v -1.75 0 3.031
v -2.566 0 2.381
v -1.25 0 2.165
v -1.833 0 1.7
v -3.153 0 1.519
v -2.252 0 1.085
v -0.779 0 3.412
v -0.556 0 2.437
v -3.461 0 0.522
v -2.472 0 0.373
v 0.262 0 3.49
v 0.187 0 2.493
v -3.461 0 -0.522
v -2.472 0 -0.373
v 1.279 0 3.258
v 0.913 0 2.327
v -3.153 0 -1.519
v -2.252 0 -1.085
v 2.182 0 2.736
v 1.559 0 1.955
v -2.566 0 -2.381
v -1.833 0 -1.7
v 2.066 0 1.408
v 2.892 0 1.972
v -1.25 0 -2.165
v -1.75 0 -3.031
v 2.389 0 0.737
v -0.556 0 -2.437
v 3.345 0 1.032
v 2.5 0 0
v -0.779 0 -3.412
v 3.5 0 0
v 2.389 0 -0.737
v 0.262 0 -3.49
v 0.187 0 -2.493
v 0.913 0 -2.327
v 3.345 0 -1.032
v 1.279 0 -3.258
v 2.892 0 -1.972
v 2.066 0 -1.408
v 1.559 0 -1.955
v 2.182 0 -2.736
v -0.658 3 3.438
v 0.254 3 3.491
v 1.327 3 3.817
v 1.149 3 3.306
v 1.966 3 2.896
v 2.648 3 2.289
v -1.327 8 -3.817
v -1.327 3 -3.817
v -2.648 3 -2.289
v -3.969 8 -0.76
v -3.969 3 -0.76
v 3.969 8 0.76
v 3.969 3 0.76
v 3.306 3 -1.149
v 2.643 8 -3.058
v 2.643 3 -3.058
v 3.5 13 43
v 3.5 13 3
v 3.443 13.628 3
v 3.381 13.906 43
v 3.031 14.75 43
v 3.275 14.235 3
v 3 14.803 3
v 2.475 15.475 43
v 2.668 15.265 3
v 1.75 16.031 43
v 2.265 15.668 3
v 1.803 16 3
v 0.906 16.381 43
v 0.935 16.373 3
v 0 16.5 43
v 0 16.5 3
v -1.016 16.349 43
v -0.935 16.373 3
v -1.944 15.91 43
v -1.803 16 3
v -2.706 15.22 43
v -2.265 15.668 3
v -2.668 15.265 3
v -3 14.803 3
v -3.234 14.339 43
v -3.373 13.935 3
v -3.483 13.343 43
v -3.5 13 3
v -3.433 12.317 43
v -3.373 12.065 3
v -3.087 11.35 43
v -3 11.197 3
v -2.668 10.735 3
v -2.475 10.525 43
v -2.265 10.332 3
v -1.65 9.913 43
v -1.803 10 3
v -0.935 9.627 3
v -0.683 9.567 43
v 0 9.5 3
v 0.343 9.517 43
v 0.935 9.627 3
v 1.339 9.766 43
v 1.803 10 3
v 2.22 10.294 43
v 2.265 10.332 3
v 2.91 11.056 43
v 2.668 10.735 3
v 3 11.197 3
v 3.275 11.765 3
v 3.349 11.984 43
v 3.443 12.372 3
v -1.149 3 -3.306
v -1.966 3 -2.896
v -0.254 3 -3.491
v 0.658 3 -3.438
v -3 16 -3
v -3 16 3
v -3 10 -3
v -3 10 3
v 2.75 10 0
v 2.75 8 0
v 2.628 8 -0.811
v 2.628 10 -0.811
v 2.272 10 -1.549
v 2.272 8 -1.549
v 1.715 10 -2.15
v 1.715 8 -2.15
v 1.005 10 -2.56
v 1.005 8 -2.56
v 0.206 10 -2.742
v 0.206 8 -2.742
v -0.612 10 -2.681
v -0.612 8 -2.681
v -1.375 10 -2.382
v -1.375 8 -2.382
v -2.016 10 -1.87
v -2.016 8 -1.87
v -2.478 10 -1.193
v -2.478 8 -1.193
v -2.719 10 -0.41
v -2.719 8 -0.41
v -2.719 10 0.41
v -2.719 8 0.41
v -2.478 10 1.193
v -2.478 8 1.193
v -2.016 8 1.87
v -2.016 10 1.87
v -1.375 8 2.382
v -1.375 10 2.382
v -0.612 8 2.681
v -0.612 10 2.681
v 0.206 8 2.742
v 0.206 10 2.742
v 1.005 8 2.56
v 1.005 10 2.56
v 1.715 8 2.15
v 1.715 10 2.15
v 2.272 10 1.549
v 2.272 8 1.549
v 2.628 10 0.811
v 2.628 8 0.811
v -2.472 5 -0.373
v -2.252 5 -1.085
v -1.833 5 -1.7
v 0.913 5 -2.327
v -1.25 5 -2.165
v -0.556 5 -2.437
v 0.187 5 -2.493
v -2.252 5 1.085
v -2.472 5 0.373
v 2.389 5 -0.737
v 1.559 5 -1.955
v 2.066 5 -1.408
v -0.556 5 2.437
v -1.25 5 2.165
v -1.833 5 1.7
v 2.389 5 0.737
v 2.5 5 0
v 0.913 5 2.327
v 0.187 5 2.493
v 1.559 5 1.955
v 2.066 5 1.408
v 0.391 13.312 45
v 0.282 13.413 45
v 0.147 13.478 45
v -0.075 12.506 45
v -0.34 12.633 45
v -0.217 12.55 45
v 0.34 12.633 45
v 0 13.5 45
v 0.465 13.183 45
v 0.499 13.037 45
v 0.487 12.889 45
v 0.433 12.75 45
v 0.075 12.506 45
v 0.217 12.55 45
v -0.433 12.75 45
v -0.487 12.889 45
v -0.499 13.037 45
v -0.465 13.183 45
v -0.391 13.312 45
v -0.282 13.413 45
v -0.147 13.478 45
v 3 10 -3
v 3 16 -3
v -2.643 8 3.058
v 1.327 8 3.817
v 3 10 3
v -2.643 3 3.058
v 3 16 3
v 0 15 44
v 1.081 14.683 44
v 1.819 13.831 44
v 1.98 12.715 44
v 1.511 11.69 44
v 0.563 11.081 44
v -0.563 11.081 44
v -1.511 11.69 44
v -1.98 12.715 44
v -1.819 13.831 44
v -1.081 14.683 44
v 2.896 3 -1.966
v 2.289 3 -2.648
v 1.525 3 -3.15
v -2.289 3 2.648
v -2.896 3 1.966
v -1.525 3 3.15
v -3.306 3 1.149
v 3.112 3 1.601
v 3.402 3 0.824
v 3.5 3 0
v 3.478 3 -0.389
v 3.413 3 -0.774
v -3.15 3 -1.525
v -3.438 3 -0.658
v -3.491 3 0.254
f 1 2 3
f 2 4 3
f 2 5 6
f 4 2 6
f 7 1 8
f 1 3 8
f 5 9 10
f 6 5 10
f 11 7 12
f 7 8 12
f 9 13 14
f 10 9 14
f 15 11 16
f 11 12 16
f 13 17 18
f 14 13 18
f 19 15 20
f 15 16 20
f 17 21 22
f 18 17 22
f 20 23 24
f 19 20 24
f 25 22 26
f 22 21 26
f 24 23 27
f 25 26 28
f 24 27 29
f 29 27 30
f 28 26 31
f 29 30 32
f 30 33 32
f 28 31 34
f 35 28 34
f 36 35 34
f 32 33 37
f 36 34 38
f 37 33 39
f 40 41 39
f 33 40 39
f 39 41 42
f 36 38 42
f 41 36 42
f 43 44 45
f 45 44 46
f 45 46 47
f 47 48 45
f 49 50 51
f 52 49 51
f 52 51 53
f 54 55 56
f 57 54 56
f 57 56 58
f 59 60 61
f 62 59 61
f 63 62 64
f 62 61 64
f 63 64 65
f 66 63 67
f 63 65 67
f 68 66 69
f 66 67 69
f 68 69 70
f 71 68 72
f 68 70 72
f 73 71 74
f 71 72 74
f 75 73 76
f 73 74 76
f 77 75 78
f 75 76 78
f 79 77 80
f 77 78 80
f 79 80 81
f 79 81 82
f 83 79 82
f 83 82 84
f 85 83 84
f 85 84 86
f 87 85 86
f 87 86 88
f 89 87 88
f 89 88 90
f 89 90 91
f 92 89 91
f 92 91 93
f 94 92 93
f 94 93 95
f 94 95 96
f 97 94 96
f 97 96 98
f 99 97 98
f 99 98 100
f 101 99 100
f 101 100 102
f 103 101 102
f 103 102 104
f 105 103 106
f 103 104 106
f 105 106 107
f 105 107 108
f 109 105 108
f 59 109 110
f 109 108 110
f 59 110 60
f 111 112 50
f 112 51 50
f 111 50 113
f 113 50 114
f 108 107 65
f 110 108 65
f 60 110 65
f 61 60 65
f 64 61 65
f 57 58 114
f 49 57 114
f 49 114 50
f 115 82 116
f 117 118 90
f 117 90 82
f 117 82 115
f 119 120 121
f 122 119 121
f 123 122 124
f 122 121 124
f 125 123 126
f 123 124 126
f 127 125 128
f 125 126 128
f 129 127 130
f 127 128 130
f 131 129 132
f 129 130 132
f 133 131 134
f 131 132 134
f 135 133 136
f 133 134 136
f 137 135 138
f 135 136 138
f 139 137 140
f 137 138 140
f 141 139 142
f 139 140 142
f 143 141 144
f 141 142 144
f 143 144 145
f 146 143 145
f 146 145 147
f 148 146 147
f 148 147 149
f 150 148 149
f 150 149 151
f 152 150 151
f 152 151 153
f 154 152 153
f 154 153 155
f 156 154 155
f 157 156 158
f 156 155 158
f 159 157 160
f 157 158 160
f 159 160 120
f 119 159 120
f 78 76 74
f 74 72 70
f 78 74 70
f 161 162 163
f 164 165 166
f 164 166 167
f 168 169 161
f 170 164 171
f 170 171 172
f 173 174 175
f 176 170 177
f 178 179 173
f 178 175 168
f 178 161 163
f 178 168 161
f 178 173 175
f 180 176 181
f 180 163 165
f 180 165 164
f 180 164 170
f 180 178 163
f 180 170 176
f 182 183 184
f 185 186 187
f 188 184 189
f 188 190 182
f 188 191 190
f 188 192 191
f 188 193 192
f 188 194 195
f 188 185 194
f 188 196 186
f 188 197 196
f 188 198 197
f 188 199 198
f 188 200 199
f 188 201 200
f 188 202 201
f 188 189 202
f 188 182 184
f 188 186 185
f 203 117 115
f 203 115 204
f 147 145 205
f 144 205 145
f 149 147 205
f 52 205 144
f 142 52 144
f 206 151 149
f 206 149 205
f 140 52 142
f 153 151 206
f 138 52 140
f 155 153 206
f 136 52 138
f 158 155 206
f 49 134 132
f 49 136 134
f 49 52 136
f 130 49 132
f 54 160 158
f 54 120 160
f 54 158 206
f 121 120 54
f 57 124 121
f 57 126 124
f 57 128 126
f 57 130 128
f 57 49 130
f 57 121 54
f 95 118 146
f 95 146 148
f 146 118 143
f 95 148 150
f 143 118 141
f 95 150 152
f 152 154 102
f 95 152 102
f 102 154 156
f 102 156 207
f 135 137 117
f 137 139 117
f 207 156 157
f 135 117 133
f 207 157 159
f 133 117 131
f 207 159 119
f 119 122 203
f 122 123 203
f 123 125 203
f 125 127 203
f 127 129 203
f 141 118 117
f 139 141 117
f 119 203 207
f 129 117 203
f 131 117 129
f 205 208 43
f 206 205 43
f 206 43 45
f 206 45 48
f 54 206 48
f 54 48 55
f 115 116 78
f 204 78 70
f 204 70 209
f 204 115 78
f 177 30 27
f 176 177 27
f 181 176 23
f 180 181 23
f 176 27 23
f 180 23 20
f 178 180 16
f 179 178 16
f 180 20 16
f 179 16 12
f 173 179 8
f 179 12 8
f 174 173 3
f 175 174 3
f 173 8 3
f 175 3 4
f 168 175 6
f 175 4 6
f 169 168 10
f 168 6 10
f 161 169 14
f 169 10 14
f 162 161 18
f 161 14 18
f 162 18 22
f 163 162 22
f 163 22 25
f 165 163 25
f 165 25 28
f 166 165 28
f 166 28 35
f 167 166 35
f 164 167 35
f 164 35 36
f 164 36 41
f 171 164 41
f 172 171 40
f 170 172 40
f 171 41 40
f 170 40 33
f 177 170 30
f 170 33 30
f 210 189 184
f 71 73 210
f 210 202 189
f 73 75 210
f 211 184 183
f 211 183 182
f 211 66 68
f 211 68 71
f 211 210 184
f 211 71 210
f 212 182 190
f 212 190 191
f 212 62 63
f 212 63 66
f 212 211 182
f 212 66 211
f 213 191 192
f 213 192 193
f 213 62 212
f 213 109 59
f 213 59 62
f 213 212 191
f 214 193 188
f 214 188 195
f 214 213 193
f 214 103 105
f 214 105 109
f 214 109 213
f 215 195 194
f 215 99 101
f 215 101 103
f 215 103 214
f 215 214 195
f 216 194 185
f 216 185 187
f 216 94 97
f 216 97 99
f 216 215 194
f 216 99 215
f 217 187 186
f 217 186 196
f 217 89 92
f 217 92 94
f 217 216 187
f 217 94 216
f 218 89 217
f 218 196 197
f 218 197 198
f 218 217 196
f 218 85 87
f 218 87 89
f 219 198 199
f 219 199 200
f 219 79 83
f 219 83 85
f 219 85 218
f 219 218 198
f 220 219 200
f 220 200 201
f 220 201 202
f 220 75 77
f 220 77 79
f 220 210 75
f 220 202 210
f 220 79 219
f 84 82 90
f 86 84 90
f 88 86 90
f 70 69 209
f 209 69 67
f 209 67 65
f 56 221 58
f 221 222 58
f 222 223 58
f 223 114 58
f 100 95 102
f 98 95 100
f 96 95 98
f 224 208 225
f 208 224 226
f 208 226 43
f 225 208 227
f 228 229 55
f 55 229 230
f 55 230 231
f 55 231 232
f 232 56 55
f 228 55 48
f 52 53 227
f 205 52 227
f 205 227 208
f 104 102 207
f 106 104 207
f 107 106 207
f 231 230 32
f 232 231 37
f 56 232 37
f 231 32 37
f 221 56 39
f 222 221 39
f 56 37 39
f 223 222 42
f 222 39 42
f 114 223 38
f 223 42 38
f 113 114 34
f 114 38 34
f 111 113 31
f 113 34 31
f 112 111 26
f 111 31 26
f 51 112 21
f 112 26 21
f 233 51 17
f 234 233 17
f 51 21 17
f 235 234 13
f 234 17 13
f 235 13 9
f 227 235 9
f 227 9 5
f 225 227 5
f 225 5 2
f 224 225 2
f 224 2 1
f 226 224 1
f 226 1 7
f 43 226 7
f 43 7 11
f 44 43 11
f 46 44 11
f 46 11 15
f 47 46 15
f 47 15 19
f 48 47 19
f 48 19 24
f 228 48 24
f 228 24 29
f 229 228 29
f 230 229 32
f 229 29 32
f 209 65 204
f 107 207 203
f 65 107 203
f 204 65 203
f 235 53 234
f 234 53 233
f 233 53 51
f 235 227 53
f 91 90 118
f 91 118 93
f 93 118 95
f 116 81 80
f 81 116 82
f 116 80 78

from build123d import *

# Parameters (mm, degrees)
SKETCH_1_R          = 3.5
EXTRUDE_1_DEPTH     = 3
EXTRUDE_2_DEPTH     = 5
SKETCH_3_R          = 2.75
EXTRUDE_3_DEPTH     = 2
SKETCH_4_R          = 2.5
CUT_EXTRUDE_1_DEPTH = 5
SKETCH_5_W          = 6
SKETCH_5_H          = 6
EXTRUDE_4_DEPTH     = 6
SKETCH_6_R          = 3.5
EXTRUDE_7_DEPTH     = 40


with BuildPart() as part:
    # 草图1 → 凸台-拉伸1 (new body)
    with BuildSketch(Plane(origin=(0, 0, 0), x_dir=(1, 0, 0), z_dir=(0, 1, 0))):
        Circle(SKETCH_1_R)
    extrude(amount=EXTRUDE_1_DEPTH)

    # 草图2 → 凸台-拉伸2 (add)
    with BuildSketch(Plane(origin=(0, 3, 0), x_dir=(1, 0, 0), z_dir=(0, 1, 0))):
        Polygon((2.642653224, 3.057730738), (-1.326745885, 3.817470195), (-3.96939911, 0.759739456), (-2.642653224, -3.057730738), (1.326745885, -3.817470195), (3.96939911, -0.759739456), align=None)
    extrude(amount=EXTRUDE_2_DEPTH)

    # 草图3 → 凸台-拉伸3 (add)
    with BuildSketch(Plane(origin=(0, 8, 0), x_dir=(1, 0, 0), z_dir=(0, 1, 0))):
        Circle(SKETCH_3_R)
    extrude(amount=EXTRUDE_3_DEPTH)

    # 草图4 → 切除-拉伸1 (cut)
    with BuildSketch(Plane.XZ):
        Circle(SKETCH_4_R)
    extrude(amount=-CUT_EXTRUDE_1_DEPTH, mode=Mode.SUBTRACT)

    # 草图5 → 凸台-拉伸4 (add)
    with BuildSketch(Plane(origin=(0, 10, 0), x_dir=(1, 0, 0), z_dir=(0, 1, 0))):
        Rectangle(SKETCH_5_W, SKETCH_5_H)
    extrude(amount=EXTRUDE_4_DEPTH)

    # 草图6 → 凸台-拉伸7 (add)
    with BuildSketch(Plane.XY.offset(3)):
        with Locations((0, 13)):
            Circle(SKETCH_6_R)
    extrude(amount=EXTRUDE_7_DEPTH)

    # 草图7 → 旋转1 (revolve)
    with BuildSketch(Plane(origin=(0, 0, 0), x_dir=(0, 0, -1), z_dir=(1, 0, 0))):
        Polygon((-43, 16.5), (-43, 13), (-45, 13), (-45, 13.5), align=None)
    revolve(axis=Axis((0, 13, 43), (0, 0, -1)))


solid = part.part
